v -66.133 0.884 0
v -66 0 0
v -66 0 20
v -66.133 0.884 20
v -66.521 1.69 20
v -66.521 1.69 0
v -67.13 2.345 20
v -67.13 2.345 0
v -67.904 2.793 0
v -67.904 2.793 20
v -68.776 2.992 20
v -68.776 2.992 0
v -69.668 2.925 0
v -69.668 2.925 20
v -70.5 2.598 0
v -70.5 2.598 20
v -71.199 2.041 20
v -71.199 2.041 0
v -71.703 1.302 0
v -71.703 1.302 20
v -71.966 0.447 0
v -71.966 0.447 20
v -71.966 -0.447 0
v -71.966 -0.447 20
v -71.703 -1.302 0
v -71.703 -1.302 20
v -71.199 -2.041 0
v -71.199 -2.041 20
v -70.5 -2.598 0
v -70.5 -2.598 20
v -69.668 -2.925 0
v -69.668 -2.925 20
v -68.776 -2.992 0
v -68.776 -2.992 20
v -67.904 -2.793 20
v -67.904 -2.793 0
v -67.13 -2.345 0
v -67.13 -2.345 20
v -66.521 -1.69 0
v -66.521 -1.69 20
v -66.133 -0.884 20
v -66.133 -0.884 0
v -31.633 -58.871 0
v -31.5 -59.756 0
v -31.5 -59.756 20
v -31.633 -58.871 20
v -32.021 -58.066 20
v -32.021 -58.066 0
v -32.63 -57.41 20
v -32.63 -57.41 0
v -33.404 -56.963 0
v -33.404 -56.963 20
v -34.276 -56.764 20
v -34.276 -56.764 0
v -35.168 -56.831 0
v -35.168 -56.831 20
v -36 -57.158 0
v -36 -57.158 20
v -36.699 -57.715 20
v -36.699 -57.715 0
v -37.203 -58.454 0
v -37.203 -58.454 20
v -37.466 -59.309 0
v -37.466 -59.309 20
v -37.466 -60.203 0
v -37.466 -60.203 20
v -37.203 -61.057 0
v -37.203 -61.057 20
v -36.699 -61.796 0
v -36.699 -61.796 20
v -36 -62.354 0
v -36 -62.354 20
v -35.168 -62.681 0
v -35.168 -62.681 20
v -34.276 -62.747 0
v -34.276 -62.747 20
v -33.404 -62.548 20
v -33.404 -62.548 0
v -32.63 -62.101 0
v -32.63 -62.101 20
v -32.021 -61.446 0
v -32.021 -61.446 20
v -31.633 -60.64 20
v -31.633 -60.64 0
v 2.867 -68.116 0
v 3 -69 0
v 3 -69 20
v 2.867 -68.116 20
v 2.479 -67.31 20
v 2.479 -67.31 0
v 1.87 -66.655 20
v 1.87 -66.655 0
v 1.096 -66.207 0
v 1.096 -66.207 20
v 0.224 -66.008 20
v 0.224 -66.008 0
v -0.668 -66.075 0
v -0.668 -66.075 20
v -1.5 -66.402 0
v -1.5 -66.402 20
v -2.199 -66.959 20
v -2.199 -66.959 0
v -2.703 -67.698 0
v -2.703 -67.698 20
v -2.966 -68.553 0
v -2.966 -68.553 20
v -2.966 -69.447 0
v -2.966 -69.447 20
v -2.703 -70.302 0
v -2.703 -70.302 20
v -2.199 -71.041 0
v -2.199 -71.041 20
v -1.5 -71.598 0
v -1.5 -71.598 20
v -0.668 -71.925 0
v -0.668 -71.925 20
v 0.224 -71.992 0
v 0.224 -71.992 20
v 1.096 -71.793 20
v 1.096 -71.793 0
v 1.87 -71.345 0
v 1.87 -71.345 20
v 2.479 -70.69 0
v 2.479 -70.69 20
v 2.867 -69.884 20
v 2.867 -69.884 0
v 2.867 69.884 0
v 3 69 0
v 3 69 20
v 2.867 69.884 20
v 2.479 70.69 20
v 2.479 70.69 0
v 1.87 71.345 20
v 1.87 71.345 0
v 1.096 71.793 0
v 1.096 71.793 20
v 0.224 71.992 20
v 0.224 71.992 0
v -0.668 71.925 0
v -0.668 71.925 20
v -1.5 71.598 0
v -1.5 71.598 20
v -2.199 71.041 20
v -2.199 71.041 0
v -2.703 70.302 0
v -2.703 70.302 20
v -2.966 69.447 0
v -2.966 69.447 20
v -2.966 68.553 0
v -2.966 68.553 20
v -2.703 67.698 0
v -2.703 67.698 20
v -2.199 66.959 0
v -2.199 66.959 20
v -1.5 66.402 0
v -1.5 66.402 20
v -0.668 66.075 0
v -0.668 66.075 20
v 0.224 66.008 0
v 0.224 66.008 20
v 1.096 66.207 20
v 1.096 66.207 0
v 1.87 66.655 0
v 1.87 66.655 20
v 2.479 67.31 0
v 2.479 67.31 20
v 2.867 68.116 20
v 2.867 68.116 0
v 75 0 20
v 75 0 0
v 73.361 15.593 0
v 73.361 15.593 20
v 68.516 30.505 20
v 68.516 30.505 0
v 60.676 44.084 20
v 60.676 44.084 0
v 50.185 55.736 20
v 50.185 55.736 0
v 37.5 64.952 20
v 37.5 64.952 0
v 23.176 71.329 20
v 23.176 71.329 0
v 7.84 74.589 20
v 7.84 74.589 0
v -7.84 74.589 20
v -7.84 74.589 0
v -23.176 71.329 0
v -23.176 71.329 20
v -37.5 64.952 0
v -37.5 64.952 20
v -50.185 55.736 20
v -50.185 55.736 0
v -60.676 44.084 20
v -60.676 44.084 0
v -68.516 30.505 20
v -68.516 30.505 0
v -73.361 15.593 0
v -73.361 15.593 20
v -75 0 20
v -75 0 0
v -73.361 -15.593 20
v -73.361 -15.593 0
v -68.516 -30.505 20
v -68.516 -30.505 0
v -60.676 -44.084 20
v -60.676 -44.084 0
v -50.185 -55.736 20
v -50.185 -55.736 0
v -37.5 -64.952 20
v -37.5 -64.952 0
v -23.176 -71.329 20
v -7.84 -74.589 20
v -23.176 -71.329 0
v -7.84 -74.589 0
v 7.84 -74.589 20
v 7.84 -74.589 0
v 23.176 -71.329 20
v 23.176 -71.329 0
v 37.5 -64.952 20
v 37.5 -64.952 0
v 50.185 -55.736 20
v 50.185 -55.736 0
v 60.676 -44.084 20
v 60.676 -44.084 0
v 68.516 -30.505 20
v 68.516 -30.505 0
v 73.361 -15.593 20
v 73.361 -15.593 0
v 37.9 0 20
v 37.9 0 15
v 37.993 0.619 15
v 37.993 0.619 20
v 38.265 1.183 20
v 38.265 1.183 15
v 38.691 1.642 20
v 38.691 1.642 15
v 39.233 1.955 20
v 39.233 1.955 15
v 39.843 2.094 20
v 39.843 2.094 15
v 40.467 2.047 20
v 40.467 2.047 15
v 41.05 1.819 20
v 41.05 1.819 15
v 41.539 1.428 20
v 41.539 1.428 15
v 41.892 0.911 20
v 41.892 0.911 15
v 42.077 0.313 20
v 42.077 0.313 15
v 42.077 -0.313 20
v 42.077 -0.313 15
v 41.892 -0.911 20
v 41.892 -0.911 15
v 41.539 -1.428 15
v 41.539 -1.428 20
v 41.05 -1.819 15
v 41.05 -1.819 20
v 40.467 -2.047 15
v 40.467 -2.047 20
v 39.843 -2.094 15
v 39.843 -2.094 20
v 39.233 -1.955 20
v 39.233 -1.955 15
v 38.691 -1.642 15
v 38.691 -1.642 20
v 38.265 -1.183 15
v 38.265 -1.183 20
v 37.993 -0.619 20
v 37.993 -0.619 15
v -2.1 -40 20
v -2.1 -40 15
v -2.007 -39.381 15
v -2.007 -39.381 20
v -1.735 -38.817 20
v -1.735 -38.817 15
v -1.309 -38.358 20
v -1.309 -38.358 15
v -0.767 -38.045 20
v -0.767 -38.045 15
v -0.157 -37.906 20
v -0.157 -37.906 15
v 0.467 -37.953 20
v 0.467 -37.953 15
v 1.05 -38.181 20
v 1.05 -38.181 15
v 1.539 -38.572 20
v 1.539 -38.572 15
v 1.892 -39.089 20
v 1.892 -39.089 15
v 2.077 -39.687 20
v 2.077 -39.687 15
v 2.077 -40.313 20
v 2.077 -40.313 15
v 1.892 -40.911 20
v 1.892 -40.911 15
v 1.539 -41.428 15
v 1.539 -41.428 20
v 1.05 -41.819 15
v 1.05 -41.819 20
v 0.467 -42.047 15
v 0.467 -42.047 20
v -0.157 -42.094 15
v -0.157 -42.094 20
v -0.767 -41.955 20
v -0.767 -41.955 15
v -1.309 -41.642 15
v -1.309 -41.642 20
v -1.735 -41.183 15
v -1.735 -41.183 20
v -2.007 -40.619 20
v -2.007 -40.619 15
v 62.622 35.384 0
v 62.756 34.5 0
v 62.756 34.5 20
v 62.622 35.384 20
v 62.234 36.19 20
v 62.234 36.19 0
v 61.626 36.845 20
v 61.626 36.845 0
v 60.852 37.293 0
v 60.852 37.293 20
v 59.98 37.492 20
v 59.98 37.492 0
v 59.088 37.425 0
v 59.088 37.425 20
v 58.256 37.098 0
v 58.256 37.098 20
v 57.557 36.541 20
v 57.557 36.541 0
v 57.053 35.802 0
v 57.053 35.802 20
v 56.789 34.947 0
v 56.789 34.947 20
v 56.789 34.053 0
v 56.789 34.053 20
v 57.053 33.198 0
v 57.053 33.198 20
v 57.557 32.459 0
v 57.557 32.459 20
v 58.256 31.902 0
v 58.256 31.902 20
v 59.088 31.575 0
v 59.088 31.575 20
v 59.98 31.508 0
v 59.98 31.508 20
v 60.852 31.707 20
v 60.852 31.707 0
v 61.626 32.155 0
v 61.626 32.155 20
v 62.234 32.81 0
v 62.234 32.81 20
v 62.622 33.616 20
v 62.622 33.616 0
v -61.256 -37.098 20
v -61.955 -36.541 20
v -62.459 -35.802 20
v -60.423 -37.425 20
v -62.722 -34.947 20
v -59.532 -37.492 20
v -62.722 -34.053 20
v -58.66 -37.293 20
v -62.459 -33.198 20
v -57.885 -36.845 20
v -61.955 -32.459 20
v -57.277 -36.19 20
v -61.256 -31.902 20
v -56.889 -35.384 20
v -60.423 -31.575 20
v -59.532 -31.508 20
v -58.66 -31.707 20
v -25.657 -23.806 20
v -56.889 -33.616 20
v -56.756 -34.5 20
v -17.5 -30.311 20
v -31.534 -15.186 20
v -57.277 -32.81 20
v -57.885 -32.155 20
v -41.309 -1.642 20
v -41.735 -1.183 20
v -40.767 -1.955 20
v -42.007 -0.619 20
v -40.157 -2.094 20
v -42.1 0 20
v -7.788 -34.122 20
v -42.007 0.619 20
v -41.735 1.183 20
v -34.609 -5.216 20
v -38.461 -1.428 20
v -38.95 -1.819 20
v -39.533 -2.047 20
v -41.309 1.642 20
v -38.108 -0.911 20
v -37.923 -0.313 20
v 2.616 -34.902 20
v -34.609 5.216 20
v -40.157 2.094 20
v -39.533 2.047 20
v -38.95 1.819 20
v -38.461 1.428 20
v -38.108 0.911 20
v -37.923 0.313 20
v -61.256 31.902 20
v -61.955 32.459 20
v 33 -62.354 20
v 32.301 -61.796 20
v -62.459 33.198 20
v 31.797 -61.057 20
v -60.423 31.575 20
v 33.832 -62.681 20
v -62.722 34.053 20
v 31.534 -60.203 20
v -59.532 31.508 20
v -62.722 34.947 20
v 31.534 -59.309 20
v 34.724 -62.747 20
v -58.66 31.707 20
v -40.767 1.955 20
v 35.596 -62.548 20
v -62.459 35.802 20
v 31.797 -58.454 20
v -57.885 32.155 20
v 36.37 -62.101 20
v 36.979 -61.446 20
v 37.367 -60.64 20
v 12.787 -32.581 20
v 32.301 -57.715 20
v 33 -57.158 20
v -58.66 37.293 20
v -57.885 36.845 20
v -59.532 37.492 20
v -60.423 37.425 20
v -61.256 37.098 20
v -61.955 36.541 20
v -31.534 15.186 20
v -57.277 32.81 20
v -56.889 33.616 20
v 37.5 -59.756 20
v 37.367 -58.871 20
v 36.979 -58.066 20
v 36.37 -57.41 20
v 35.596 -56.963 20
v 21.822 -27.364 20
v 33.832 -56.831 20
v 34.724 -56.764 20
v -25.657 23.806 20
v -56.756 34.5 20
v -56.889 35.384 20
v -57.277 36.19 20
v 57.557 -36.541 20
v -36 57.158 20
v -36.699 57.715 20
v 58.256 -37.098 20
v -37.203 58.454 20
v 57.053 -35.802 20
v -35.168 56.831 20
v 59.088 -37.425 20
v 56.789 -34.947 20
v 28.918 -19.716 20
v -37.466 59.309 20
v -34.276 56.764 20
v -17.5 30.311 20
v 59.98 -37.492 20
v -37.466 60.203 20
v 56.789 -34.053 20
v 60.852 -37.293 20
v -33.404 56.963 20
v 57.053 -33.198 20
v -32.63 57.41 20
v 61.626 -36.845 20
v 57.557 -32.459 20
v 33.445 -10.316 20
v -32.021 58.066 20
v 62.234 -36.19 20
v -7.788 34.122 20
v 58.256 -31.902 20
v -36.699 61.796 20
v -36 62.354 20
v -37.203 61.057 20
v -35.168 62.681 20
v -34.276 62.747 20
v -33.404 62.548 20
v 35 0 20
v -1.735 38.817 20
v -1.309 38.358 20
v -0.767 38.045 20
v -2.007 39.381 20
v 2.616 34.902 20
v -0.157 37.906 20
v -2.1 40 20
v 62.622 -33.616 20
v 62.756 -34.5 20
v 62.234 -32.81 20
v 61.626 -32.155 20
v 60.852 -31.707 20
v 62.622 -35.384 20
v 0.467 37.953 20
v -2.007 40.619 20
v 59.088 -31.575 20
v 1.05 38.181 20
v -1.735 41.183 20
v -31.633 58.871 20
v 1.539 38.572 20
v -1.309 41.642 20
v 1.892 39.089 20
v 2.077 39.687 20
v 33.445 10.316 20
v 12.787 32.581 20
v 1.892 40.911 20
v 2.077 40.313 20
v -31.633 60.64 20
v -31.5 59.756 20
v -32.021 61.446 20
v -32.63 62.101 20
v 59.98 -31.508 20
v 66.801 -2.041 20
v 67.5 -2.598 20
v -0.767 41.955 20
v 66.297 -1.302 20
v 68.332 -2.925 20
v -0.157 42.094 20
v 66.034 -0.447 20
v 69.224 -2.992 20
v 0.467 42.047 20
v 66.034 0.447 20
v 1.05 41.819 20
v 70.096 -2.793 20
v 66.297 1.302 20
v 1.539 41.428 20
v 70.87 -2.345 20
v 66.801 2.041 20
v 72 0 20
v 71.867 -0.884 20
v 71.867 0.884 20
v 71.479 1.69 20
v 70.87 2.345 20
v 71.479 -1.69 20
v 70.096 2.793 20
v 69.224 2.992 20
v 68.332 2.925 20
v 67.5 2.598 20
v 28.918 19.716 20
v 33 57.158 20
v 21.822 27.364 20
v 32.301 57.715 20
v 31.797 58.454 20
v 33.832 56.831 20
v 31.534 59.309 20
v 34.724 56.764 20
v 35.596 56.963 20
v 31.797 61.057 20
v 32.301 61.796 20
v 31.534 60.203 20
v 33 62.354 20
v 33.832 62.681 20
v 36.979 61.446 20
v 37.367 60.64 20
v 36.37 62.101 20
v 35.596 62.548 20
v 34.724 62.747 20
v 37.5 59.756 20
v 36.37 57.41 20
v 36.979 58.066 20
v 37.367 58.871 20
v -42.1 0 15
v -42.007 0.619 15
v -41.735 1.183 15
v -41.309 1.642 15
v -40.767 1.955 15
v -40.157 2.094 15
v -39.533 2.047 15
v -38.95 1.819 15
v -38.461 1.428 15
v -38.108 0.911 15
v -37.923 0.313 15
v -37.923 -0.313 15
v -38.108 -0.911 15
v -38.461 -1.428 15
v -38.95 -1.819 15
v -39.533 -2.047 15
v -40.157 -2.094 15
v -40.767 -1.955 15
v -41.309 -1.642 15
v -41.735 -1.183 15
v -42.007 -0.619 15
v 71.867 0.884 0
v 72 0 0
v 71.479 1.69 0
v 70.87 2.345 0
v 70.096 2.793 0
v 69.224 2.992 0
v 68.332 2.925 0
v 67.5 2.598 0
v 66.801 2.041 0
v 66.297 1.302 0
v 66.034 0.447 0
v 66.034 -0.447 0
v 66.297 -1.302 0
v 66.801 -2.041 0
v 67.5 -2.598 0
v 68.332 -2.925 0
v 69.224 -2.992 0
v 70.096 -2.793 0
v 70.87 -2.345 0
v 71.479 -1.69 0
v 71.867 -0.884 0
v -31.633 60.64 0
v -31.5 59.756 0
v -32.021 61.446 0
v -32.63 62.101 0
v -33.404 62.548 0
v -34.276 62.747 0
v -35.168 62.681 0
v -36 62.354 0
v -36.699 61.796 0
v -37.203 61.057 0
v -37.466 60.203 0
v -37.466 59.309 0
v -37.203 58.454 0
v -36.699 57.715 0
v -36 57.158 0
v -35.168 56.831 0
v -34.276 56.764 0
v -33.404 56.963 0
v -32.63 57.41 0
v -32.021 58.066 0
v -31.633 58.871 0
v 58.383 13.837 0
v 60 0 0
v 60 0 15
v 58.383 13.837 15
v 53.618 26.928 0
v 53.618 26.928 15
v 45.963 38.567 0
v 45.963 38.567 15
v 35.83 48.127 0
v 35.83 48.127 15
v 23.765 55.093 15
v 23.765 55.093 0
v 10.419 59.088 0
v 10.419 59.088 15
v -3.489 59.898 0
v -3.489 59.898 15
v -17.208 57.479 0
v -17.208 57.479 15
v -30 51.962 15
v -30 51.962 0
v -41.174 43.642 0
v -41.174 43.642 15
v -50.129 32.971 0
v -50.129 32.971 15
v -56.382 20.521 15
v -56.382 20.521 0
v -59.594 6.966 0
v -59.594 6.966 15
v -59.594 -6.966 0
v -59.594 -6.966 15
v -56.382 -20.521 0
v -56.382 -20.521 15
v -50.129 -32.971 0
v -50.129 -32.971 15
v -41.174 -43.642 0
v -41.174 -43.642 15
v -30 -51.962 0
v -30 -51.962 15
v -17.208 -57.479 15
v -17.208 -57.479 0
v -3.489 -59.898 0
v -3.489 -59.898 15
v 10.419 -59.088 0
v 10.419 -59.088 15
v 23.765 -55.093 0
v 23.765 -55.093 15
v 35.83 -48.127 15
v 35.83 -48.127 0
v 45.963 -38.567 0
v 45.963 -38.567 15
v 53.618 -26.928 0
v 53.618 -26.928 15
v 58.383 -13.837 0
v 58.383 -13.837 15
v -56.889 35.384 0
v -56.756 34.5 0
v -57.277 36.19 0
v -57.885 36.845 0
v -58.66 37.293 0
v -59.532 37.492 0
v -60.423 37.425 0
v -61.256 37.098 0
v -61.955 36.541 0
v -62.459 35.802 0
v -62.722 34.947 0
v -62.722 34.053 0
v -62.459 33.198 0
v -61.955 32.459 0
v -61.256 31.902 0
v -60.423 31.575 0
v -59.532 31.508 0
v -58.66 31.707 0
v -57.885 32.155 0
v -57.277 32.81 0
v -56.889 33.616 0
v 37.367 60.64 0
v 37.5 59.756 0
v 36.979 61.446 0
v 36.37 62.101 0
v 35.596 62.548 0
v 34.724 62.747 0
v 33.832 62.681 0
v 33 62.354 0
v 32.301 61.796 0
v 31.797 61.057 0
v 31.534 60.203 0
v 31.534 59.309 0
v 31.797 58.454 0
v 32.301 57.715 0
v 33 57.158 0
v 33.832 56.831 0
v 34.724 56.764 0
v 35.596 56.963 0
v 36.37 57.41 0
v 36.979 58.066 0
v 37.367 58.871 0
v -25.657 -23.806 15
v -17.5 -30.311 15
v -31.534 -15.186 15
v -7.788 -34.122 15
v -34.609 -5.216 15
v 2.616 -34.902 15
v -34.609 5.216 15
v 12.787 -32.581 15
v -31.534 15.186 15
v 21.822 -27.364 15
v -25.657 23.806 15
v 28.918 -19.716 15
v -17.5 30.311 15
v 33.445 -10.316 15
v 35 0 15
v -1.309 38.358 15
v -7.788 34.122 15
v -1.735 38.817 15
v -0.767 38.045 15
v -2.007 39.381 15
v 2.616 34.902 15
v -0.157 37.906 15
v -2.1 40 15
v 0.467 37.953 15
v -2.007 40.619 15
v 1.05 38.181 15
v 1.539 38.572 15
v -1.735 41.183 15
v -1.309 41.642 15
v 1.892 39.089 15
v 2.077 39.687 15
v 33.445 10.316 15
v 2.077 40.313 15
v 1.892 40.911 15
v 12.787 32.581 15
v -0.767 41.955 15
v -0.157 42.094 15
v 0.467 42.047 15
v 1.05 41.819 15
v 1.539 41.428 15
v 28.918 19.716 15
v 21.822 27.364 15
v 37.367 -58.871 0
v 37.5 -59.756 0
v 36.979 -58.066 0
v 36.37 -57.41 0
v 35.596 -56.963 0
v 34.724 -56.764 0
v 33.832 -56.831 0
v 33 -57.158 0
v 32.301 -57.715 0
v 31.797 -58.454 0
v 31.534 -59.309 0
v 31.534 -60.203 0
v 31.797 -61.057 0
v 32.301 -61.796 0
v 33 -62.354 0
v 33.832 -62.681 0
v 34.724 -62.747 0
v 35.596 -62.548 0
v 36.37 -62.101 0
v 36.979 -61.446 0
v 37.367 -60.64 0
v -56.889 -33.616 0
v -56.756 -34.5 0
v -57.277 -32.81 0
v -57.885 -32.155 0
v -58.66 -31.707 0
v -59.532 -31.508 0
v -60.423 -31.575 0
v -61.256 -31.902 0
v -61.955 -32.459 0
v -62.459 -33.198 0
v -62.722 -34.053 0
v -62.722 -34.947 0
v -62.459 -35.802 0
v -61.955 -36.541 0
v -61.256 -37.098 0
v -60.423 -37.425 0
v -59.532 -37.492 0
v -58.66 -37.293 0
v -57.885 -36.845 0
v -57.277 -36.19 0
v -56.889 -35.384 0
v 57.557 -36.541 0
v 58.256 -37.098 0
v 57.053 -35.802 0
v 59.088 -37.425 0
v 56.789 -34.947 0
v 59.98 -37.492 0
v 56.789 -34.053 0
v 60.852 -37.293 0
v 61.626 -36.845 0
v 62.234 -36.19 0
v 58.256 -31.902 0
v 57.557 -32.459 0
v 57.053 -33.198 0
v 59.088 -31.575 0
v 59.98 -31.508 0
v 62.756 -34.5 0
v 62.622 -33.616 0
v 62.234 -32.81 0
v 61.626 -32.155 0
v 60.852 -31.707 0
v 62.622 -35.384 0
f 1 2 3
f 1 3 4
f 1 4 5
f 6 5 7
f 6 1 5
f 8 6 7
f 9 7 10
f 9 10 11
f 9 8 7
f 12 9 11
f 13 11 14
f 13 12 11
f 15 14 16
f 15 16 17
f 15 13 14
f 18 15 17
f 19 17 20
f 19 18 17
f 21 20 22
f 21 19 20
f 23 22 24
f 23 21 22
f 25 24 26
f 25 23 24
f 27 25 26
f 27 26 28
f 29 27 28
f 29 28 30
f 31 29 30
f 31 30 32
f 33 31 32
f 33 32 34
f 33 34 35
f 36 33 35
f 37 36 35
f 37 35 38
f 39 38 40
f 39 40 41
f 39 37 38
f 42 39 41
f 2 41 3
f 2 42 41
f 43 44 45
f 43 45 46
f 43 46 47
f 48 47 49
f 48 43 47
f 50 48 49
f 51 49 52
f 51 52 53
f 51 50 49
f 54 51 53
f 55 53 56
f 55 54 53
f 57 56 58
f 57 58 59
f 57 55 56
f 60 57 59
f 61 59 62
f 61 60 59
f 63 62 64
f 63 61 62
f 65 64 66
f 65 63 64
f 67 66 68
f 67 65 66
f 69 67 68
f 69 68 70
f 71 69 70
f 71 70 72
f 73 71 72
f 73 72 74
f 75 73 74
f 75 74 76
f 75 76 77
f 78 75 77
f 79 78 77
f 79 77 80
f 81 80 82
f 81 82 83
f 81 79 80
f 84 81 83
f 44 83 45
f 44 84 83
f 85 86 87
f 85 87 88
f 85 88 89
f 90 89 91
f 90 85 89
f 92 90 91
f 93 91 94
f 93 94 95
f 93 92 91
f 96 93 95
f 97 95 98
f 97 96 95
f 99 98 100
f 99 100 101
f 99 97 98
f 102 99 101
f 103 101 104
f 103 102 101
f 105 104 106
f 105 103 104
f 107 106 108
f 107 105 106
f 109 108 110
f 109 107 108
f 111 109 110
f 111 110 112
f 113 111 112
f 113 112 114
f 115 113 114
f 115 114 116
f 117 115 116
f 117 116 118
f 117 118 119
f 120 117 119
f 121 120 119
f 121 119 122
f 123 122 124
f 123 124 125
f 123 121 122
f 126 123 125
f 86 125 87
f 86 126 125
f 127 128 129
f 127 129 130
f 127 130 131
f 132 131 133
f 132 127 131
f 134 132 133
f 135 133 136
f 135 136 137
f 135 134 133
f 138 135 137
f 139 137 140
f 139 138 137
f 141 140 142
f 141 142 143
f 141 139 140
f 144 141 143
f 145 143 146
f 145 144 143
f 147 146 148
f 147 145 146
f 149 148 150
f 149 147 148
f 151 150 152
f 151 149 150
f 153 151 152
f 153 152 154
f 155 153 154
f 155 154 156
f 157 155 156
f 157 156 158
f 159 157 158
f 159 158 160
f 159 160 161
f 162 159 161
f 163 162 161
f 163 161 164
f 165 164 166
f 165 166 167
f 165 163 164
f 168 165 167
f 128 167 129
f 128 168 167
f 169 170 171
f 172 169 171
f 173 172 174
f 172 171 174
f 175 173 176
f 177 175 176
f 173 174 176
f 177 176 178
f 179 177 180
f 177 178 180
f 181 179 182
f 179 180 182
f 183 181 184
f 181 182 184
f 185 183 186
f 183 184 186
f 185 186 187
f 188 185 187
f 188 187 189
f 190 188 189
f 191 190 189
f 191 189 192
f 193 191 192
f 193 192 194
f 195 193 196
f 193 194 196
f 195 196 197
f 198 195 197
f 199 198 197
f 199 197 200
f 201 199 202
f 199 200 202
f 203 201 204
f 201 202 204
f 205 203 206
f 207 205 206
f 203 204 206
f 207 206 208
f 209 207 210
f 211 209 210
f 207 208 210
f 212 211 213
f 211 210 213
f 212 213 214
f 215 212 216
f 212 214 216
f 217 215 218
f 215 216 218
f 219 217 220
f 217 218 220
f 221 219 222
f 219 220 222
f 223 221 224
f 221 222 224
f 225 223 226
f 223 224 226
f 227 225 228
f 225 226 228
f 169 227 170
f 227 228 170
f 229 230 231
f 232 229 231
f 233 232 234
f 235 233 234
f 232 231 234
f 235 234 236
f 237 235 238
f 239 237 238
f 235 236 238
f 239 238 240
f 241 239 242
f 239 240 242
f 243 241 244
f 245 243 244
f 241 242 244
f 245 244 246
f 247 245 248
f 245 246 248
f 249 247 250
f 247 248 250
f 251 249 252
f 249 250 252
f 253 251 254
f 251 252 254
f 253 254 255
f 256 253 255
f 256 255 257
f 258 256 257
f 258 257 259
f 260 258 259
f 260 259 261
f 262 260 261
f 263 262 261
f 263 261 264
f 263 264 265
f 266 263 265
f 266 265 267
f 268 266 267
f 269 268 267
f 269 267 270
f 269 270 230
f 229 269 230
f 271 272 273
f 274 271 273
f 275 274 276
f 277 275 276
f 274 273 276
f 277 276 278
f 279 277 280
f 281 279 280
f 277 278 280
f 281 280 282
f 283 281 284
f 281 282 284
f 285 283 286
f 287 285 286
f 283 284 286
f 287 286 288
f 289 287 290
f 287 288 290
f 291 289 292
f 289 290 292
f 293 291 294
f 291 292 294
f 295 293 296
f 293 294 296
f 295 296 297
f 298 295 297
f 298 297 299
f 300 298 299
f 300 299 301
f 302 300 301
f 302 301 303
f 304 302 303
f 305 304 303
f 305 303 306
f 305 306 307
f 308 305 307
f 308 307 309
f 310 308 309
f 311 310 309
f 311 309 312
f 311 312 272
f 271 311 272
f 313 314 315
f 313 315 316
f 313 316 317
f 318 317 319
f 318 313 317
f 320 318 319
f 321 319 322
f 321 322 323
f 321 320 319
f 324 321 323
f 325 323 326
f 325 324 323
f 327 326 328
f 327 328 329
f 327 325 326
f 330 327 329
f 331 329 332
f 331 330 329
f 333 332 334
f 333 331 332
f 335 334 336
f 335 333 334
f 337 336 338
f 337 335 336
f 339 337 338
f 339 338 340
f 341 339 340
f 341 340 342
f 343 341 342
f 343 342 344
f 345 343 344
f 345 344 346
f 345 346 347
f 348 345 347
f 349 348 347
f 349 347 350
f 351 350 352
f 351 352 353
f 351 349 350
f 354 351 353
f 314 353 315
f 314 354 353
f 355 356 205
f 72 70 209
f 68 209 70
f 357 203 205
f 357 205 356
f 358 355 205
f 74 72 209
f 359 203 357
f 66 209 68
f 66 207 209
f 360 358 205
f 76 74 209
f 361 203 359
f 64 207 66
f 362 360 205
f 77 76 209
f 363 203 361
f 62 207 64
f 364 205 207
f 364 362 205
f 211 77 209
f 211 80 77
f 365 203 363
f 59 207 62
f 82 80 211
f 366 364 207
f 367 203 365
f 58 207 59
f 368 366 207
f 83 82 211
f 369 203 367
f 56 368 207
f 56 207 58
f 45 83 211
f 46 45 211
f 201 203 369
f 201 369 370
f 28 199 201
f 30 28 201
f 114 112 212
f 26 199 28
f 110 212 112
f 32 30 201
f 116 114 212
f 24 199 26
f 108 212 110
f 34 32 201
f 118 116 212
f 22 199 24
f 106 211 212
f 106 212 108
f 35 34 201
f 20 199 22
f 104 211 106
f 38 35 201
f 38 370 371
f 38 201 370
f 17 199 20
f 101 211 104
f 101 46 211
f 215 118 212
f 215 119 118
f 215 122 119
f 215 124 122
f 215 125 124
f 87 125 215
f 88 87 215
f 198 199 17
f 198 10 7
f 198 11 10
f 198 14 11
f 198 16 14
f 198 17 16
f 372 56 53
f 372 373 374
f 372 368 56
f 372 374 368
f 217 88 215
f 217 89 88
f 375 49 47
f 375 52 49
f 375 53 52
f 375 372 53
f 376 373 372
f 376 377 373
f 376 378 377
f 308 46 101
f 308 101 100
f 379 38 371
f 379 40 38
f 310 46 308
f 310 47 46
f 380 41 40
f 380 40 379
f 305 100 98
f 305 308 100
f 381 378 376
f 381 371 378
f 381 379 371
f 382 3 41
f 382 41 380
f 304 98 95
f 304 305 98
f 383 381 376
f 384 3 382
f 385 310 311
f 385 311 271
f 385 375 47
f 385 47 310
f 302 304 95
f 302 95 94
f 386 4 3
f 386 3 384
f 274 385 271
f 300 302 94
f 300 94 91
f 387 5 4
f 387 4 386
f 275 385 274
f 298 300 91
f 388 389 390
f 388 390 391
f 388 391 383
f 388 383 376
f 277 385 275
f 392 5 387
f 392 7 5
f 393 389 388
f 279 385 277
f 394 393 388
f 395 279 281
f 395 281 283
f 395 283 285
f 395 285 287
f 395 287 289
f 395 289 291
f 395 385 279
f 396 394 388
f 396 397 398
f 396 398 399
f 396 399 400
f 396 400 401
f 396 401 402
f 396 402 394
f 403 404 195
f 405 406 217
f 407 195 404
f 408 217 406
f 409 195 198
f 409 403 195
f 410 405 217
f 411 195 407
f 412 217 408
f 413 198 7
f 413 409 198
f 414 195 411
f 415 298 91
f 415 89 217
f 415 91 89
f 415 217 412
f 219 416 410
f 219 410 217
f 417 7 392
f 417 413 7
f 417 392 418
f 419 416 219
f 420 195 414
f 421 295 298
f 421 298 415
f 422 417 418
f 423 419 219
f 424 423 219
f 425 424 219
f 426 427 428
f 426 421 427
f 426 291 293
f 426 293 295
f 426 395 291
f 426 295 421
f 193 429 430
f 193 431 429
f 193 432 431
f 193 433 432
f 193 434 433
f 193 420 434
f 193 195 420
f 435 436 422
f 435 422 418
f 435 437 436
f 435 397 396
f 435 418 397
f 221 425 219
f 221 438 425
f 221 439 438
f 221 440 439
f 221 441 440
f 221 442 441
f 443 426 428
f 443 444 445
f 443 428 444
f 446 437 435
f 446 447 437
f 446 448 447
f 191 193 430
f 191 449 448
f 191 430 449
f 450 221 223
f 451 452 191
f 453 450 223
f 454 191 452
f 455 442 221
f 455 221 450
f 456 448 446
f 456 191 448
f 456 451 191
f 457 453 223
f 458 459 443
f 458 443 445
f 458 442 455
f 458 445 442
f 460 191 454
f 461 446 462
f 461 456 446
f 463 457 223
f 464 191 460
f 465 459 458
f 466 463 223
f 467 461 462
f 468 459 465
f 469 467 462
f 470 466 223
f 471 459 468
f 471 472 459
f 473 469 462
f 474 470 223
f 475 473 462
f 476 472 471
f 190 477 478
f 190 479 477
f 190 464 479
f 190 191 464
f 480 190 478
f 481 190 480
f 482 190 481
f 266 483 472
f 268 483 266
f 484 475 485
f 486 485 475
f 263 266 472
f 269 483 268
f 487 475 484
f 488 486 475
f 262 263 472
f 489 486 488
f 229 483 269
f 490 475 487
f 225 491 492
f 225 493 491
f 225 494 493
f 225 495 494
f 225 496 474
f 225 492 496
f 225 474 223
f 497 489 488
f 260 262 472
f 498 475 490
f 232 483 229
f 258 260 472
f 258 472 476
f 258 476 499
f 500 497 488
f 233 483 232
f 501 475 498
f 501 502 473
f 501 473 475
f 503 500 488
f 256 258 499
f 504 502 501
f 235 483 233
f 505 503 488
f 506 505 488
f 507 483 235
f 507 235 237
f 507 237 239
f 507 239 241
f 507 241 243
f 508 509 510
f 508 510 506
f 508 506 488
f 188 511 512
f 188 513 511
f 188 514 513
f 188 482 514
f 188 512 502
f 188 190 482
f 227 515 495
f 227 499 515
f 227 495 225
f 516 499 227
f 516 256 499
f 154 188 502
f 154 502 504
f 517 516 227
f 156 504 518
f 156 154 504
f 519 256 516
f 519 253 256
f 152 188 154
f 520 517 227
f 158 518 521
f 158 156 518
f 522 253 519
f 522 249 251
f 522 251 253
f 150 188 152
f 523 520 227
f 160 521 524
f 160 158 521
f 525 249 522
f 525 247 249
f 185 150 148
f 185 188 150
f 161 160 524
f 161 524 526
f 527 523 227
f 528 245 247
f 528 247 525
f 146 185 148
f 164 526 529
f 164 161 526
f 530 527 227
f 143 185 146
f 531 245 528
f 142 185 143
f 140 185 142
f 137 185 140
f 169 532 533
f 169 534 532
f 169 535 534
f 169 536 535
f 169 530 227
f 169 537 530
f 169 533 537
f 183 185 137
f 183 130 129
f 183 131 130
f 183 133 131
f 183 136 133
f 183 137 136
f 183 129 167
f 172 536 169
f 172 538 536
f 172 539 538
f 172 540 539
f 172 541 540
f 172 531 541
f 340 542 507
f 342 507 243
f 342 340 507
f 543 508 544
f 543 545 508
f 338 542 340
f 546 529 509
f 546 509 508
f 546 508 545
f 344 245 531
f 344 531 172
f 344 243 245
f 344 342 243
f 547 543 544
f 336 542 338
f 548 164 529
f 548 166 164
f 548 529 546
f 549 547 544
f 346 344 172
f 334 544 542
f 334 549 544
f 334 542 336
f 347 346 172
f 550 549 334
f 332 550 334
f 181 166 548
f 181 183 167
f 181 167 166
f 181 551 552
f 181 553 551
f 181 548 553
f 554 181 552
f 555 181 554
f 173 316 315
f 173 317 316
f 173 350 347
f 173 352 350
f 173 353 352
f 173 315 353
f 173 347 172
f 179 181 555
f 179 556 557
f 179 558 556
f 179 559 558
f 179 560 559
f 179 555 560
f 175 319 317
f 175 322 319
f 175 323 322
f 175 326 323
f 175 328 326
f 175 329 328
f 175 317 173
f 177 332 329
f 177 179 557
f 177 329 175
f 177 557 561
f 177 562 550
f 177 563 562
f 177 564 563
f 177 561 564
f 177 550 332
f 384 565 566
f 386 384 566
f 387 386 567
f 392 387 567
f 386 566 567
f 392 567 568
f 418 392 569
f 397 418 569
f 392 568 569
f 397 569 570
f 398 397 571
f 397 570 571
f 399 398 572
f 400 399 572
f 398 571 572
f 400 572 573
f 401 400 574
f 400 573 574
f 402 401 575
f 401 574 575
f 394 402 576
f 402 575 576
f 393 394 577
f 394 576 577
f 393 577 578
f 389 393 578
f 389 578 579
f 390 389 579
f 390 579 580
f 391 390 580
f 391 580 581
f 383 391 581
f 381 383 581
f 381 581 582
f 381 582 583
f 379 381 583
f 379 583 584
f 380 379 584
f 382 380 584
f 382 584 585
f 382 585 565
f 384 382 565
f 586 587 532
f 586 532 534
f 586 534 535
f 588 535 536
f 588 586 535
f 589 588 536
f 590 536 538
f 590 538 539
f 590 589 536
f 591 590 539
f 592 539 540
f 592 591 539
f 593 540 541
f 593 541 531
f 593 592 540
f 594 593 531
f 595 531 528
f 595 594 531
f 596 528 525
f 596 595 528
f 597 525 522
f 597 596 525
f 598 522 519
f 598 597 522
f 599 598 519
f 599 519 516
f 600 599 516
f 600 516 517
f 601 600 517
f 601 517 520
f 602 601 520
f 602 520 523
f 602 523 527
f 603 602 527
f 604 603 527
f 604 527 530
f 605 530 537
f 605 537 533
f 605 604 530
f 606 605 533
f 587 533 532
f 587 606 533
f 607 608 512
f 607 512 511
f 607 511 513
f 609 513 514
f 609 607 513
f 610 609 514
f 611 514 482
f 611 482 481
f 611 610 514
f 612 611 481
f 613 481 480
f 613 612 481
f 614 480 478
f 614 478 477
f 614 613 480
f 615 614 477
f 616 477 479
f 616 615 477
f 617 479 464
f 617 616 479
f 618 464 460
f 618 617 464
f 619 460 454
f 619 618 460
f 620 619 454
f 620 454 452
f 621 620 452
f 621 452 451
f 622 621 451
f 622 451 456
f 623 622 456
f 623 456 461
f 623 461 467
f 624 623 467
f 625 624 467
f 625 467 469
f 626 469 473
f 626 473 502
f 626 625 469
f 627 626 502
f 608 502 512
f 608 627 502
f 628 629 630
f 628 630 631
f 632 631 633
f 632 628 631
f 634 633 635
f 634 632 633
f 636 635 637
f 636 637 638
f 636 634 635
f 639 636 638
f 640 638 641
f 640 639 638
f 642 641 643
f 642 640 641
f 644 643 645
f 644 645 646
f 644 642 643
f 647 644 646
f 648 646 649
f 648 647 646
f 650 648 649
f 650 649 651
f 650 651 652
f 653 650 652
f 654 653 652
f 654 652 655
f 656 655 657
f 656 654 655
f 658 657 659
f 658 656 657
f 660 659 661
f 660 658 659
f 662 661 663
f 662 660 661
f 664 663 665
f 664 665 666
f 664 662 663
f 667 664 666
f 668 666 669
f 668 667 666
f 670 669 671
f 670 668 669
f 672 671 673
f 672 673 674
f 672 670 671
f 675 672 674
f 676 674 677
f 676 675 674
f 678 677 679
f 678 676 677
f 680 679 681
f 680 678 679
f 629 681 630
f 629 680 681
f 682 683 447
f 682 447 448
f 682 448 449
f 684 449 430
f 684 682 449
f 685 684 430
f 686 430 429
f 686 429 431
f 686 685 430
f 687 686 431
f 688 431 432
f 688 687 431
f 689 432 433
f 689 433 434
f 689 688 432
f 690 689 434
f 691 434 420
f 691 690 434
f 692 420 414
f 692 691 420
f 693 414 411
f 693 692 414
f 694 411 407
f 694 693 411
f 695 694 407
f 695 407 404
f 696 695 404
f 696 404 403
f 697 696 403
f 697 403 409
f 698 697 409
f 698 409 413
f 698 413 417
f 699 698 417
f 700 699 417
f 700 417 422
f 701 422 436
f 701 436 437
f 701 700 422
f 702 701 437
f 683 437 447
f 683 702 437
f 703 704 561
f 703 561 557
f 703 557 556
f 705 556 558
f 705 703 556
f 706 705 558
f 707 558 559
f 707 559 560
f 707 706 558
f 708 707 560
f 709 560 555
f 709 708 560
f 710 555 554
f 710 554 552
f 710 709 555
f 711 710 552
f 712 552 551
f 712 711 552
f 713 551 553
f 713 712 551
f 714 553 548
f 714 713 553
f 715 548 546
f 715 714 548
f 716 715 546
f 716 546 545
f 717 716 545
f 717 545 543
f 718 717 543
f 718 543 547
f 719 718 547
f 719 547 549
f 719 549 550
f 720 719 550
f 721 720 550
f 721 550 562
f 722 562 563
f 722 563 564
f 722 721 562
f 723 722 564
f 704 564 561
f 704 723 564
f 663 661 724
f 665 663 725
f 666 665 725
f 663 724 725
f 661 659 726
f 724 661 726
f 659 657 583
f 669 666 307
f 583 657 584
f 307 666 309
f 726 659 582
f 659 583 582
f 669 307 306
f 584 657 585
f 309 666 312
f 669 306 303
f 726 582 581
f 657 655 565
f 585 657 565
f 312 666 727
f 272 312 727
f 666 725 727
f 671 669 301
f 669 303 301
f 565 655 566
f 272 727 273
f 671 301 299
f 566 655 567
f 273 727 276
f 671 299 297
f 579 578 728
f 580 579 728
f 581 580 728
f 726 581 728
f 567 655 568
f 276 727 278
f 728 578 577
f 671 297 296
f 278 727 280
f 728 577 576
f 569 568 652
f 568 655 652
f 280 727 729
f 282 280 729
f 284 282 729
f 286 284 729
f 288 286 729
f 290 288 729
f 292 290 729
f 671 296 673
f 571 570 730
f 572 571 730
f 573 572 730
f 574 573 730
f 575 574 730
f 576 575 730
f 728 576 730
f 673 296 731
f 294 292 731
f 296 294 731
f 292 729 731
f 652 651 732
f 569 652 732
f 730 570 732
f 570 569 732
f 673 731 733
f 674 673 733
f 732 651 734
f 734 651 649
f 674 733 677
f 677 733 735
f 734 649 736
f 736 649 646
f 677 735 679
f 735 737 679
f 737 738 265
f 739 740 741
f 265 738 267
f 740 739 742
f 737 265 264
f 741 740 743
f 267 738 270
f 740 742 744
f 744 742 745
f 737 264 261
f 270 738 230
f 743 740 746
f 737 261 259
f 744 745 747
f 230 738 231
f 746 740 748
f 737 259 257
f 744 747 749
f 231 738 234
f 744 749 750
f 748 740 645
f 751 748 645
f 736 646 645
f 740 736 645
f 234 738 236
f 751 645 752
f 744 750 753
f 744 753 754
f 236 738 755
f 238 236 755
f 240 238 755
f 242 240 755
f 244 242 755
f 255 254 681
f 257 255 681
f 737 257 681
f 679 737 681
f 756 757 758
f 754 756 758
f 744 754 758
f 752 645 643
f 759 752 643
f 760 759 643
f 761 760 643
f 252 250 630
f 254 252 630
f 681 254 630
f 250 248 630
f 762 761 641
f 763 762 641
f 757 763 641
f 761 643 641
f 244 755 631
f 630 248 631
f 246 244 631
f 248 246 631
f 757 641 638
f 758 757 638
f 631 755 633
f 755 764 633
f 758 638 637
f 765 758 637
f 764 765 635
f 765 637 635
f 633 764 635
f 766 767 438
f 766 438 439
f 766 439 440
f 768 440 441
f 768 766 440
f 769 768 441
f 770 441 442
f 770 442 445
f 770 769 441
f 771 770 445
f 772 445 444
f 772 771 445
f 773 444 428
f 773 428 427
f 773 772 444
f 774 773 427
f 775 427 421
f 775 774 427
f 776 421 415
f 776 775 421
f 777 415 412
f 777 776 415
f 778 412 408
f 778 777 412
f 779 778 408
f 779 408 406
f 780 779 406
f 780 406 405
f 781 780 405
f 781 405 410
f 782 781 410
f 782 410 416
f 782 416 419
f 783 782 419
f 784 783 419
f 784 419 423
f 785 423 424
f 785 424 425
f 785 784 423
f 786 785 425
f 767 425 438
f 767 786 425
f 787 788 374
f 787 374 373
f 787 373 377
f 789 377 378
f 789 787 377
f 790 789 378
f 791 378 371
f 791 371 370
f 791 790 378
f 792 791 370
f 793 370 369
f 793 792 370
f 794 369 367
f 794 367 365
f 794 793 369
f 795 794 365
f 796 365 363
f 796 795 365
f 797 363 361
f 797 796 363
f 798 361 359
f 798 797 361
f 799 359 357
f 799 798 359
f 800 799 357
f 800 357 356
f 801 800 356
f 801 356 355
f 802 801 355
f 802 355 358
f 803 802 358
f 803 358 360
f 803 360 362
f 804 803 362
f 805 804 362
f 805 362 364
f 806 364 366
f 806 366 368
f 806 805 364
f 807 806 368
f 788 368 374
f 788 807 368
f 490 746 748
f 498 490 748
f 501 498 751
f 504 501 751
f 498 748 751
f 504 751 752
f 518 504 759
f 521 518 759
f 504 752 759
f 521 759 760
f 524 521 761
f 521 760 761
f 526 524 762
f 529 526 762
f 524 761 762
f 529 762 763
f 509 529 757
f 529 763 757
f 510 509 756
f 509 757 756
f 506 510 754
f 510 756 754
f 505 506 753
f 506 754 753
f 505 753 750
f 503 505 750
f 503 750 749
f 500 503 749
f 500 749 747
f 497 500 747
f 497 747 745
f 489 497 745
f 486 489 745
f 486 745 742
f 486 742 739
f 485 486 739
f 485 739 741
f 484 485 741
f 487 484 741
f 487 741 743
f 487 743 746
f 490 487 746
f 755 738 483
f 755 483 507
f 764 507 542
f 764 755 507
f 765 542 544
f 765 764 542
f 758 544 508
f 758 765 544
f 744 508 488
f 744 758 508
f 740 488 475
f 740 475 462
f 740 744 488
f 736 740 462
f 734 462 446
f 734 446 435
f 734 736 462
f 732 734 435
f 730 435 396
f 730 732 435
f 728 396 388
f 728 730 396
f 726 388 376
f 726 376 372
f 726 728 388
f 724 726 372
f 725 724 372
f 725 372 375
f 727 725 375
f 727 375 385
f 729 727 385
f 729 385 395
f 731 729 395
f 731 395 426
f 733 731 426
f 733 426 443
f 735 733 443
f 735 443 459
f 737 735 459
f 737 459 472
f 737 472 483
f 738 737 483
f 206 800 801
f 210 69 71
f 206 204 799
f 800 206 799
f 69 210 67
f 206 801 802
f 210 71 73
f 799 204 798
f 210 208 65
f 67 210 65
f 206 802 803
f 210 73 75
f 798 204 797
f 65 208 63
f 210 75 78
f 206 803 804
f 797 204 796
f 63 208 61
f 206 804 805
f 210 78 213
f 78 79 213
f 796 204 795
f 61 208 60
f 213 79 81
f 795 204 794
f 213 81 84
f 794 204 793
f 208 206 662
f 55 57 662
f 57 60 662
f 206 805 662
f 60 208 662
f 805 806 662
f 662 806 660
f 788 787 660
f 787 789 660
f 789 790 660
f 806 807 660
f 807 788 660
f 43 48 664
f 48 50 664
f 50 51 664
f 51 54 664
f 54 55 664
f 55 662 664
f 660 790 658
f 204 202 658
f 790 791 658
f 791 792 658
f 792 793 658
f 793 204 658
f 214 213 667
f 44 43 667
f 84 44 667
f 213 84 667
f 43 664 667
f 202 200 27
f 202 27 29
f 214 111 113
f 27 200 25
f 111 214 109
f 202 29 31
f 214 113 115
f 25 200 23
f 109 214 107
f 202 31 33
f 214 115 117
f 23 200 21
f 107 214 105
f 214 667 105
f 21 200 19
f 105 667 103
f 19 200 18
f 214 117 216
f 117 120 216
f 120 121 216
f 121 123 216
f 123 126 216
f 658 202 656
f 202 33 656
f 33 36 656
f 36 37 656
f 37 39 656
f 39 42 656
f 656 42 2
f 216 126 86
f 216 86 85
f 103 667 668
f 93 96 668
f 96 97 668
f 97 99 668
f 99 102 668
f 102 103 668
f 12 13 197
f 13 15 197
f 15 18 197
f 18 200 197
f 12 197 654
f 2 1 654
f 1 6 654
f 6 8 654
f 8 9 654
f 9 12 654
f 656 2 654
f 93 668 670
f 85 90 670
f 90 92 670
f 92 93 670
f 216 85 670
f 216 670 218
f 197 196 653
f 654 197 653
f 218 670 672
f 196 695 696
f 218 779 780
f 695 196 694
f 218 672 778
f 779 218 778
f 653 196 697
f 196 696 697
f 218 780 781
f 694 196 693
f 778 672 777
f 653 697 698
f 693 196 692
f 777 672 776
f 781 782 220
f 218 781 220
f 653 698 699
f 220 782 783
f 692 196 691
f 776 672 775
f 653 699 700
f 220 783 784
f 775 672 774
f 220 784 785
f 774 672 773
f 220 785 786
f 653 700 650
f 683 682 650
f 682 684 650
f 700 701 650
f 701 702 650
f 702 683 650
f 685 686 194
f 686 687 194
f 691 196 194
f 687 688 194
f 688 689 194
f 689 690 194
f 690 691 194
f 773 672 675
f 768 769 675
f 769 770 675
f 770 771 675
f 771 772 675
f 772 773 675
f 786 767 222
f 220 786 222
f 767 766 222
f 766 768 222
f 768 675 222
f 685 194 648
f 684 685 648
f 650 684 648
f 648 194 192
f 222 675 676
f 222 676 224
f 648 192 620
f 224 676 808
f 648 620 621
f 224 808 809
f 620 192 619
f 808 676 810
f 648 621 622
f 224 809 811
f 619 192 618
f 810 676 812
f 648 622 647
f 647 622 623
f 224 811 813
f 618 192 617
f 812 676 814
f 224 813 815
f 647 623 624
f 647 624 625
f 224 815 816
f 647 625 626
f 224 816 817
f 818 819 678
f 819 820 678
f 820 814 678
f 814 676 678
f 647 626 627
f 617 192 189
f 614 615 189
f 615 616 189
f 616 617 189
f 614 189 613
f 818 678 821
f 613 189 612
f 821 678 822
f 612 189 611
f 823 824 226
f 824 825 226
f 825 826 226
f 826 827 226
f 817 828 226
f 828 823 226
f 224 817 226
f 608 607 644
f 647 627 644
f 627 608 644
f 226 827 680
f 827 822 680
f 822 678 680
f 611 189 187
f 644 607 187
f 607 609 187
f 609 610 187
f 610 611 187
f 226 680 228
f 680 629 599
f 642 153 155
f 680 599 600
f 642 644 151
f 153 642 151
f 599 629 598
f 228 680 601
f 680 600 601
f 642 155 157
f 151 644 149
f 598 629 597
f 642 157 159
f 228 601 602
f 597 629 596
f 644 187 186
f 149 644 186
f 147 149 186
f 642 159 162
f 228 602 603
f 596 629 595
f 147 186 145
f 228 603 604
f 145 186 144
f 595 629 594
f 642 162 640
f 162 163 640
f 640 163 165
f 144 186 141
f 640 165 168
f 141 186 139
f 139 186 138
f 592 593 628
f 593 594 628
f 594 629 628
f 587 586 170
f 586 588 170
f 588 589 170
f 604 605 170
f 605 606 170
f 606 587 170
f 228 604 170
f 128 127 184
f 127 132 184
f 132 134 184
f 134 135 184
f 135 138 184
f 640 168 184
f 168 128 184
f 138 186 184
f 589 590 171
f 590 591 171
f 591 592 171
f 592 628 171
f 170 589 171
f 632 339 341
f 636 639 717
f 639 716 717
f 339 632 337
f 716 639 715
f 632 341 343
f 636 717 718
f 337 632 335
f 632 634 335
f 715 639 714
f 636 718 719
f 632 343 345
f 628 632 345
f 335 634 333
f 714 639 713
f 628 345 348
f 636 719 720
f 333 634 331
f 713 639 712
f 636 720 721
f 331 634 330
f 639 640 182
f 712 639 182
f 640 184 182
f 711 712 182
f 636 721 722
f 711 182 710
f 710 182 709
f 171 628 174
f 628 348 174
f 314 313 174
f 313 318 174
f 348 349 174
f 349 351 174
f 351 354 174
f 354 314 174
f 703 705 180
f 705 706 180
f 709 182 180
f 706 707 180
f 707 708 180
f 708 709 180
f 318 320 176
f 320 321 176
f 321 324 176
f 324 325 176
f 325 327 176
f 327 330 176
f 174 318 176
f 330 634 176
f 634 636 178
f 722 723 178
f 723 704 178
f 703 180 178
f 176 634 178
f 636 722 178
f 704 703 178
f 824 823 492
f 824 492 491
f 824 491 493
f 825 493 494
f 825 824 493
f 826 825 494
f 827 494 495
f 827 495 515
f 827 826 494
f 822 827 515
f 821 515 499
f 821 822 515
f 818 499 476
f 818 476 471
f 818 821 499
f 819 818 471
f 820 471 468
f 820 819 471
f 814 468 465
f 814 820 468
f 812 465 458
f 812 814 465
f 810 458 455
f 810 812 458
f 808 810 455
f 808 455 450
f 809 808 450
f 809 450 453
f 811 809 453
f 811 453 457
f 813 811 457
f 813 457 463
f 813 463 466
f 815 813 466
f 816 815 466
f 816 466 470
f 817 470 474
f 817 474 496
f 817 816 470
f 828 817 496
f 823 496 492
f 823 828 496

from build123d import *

# Parameters (mm, degrees)
SKETCH_1_R          = 75
SKETCH_1_R_2        = 35
SKETCH_1_R_3        = 3
EXTRUDE_1_DEPTH     = 20
SKETCH_2_R          = 60
CUT_EXTRUDE_1_DEPTH = 15
HOLE_WIZARD_M5_2_D  = 4.2


with BuildPart() as part:
    # 草图1 → 凸台-拉伸1 (new body)
    with BuildSketch(Plane.XY):
        Circle(SKETCH_1_R)
        Circle(SKETCH_1_R_2, mode=Mode.SUBTRACT)
        with Locations((-69, 0)):
            Circle(SKETCH_1_R_3, mode=Mode.SUBTRACT)
        with Locations((-59.755752861, 34.5)):
            Circle(SKETCH_1_R_3, mode=Mode.SUBTRACT)
        with Locations((-34.5, 59.755752861)):
            Circle(SKETCH_1_R_3, mode=Mode.SUBTRACT)
        with Locations((0, 69)):
            Circle(SKETCH_1_R_3, mode=Mode.SUBTRACT)
        with Locations((34.5, 59.755752861)):
            Circle(SKETCH_1_R_3, mode=Mode.SUBTRACT)
        with Locations((59.755752861, 34.5)):
            Circle(SKETCH_1_R_3, mode=Mode.SUBTRACT)
        with Locations((69, 0)):
            Circle(SKETCH_1_R_3, mode=Mode.SUBTRACT)
        with Locations((59.755752861, -34.5)):
            Circle(SKETCH_1_R_3, mode=Mode.SUBTRACT)
        with Locations((34.5, -59.755752861)):
            Circle(SKETCH_1_R_3, mode=Mode.SUBTRACT)
        with Locations((0, -69)):
            Circle(SKETCH_1_R_3, mode=Mode.SUBTRACT)
        with Locations((-34.5, -59.755752861)):
            Circle(SKETCH_1_R_3, mode=Mode.SUBTRACT)
        with Locations((-59.755752861, -34.5)):
            Circle(SKETCH_1_R_3, mode=Mode.SUBTRACT)
    extrude(amount=EXTRUDE_1_DEPTH)

    # 草图2 → 切除-拉伸1 (cut)
    with BuildSketch(Plane.XY):
        Circle(SKETCH_2_R)
    extrude(amount=CUT_EXTRUDE_1_DEPTH, mode=Mode.SUBTRACT)

    # M5 螺纹孔的螺纹孔钻头2 (through all)
    with Locations(Plane.XY.offset(20)):
        with Locations((0, 40), (40, 0), (0, -40), (-40, 0)):
            Hole(HOLE_WIZARD_M5_2_D / 2)


solid = part.part
